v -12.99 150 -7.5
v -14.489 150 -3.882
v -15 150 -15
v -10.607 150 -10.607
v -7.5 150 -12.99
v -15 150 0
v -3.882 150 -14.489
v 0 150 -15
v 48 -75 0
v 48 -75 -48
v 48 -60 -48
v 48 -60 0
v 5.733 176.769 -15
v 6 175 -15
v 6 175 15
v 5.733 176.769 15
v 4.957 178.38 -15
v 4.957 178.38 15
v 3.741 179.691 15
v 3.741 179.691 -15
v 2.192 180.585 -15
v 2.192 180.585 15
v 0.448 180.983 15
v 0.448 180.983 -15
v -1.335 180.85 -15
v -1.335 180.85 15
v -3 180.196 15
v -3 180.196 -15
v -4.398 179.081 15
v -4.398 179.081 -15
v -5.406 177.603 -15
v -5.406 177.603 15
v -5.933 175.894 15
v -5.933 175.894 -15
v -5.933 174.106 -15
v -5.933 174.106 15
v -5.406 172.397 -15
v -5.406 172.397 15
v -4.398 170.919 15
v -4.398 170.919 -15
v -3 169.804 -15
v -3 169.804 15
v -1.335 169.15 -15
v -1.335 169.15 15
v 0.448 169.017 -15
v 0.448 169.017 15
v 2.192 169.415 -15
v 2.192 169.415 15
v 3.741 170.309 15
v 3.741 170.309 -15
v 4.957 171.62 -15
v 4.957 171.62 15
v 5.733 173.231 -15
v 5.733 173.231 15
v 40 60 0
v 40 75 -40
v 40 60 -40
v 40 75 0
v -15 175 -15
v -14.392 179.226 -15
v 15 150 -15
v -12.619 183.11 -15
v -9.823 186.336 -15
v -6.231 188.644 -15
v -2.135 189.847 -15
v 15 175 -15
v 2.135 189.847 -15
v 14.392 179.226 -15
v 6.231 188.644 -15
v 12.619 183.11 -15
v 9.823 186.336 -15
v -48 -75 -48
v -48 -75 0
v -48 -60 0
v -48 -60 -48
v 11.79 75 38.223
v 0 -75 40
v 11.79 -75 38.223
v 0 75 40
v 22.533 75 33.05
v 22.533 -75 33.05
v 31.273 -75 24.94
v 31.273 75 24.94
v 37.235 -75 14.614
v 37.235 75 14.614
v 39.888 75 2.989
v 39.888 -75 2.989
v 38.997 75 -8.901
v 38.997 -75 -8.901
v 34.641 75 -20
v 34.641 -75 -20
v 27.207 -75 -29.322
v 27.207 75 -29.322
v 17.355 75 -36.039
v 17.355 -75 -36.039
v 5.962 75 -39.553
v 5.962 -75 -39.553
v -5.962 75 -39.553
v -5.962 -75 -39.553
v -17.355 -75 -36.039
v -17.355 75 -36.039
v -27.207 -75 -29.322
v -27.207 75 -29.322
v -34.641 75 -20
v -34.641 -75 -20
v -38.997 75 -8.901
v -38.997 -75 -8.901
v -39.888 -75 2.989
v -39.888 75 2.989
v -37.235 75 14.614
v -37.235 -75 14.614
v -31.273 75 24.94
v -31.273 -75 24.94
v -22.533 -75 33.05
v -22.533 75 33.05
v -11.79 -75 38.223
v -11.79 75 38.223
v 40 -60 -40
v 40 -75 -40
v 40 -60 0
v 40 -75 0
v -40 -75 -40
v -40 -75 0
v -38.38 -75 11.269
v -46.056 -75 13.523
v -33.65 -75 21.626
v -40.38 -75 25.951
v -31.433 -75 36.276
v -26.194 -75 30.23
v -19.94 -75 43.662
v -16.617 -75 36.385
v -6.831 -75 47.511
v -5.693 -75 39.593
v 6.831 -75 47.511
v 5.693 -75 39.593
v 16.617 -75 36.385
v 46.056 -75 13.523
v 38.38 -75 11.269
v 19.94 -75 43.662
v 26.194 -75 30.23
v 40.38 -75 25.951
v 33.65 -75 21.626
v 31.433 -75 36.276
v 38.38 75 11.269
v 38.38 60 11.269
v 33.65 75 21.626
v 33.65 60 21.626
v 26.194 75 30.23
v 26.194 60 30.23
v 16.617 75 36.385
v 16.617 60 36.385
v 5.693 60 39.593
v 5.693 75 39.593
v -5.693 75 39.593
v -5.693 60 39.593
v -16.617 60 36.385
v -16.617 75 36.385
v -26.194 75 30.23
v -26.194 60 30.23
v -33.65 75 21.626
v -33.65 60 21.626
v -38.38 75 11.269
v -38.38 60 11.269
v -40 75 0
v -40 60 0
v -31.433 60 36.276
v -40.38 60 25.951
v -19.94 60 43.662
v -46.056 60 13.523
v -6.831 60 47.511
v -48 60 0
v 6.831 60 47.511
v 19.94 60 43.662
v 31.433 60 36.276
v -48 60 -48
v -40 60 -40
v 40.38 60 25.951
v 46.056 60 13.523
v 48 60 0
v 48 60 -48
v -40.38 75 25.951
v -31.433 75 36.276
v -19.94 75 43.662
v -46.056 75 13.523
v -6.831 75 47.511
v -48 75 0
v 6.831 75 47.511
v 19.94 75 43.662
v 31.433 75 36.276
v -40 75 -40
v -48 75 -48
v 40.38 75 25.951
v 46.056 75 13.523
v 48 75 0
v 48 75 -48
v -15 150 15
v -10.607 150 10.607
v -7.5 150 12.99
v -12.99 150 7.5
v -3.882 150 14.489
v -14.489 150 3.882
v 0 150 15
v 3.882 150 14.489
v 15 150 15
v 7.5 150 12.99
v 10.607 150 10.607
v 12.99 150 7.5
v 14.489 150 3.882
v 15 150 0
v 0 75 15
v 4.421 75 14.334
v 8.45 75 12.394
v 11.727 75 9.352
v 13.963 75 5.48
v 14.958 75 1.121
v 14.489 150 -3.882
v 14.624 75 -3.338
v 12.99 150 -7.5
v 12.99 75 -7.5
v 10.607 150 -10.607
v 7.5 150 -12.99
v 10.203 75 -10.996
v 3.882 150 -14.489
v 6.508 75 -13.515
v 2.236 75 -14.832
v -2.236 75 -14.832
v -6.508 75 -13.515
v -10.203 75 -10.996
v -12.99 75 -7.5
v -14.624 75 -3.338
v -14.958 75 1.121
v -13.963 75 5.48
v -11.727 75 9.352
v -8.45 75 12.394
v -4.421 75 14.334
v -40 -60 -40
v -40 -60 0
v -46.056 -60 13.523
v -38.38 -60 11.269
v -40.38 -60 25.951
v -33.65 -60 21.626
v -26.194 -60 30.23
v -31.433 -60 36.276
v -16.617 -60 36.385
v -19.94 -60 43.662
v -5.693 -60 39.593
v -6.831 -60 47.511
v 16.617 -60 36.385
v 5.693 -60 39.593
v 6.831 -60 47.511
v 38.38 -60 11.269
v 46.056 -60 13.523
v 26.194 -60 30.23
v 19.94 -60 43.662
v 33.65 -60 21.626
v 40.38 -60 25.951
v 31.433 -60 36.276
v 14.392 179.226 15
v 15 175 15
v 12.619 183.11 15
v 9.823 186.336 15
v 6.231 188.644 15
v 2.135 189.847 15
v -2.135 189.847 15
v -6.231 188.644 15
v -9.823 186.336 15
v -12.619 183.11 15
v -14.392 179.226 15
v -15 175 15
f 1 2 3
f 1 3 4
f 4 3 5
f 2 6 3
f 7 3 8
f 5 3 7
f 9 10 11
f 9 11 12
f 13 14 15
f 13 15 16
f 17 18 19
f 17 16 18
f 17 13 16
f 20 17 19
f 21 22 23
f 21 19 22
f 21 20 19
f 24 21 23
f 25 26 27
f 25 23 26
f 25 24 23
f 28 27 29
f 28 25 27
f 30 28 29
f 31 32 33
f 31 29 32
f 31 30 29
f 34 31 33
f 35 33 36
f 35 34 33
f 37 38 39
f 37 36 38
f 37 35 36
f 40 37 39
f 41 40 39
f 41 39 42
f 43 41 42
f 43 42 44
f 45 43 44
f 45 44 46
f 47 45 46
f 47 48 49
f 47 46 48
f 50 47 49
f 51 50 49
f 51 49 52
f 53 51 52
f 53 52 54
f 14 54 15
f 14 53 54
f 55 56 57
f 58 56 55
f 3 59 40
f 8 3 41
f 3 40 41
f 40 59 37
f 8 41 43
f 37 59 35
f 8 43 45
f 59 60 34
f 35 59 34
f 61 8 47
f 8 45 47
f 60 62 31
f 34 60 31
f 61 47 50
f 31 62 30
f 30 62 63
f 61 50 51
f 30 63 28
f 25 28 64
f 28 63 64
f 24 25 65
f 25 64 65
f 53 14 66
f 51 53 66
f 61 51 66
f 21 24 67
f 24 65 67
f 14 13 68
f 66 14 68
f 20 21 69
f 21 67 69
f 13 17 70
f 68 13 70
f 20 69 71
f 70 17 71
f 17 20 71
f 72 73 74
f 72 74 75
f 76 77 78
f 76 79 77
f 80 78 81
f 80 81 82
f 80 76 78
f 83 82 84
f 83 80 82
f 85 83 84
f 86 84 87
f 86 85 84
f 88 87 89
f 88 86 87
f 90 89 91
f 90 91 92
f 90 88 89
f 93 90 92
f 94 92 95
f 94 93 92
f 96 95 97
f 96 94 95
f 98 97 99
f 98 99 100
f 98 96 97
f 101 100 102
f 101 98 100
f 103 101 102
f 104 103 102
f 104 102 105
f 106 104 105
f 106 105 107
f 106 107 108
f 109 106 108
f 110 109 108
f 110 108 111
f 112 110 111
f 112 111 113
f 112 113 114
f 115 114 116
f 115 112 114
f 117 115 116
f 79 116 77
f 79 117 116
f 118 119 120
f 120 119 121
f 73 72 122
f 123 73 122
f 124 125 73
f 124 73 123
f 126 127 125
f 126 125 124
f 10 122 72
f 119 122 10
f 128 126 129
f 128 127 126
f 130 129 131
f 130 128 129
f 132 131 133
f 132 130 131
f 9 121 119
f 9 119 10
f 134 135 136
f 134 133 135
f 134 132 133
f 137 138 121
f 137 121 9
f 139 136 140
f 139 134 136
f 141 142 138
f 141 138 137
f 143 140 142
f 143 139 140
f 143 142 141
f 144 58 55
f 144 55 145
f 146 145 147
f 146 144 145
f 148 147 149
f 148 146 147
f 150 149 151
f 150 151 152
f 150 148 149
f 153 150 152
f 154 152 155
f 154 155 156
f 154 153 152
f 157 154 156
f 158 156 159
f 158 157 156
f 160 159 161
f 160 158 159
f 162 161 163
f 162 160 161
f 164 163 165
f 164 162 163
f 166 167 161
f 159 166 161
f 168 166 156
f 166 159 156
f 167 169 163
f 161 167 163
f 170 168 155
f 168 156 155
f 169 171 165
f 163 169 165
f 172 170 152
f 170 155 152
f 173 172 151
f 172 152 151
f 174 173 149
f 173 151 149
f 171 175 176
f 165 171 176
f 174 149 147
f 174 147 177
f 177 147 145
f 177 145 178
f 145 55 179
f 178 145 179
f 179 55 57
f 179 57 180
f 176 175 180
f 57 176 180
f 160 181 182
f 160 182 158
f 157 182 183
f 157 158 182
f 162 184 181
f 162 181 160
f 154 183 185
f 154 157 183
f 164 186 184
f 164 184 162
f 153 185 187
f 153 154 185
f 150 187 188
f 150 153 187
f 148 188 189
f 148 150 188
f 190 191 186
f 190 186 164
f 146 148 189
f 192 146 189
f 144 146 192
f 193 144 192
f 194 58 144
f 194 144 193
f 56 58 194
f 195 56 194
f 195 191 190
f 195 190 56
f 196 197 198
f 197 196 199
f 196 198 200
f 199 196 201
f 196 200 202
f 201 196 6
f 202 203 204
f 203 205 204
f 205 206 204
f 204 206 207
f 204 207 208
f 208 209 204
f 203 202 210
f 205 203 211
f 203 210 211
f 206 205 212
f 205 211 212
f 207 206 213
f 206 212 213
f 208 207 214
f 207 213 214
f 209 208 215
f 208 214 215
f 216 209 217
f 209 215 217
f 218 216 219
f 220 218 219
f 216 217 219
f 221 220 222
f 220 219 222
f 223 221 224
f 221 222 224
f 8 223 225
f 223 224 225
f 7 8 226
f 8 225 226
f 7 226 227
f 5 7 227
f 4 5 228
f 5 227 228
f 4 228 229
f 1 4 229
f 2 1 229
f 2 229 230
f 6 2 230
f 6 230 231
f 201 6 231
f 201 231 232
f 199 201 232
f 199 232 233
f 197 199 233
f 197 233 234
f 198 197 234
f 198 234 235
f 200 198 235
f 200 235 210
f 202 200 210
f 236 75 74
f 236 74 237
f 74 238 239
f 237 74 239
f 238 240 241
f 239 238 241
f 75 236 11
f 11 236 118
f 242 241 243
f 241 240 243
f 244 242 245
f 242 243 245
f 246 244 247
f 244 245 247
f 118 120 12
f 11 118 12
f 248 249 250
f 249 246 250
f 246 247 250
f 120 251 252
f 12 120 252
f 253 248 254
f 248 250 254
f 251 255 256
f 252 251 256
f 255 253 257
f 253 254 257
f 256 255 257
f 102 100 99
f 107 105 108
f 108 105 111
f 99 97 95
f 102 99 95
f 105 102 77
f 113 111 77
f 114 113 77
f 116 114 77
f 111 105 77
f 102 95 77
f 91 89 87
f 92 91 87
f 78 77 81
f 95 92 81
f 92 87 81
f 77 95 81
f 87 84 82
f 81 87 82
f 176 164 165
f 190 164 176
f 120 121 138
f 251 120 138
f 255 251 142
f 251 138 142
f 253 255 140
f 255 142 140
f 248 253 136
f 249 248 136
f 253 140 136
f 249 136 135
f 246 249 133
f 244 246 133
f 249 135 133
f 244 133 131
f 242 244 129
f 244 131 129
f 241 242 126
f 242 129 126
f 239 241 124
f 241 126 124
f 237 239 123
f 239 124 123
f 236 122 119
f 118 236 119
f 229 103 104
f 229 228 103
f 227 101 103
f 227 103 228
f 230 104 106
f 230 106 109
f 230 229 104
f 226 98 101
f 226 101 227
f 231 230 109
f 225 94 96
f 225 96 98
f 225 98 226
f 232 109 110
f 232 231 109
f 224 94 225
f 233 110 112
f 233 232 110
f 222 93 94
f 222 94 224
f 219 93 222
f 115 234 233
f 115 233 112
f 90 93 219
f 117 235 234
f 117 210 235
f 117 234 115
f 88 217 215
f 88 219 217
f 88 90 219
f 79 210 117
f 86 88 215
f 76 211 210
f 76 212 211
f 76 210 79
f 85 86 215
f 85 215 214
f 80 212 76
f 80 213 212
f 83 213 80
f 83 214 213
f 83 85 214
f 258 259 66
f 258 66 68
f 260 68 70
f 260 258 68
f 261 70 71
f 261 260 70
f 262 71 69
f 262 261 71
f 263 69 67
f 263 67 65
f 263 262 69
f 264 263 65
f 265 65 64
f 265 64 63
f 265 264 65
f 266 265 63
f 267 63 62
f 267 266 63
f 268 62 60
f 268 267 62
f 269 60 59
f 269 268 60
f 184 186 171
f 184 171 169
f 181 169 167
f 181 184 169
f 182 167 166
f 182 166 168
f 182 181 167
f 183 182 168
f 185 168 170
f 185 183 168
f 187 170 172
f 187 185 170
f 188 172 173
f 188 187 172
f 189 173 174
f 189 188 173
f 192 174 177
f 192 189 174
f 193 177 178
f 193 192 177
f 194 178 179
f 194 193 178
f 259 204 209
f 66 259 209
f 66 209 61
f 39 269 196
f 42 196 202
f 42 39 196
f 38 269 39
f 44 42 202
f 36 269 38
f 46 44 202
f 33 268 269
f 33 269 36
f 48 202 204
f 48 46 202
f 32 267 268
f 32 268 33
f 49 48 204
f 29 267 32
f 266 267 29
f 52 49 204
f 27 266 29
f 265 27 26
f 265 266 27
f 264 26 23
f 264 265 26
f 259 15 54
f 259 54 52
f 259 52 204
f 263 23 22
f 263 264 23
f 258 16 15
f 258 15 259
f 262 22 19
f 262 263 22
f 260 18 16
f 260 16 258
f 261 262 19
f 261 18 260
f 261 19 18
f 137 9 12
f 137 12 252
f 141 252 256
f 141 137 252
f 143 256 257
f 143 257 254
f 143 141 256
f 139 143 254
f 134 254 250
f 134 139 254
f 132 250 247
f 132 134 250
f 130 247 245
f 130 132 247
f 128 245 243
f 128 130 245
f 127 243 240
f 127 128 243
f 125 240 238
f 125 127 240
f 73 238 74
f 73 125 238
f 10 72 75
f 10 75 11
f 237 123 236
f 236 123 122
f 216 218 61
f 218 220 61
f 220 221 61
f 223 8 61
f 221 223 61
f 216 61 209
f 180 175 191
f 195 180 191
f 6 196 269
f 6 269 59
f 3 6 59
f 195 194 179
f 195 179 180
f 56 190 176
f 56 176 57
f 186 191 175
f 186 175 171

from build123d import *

# Parameters (mm, degrees)
SKETCH1_R               = 40
BOSS_EXTRUDE1_DEPTH     = 75
SKETCH2_R               = 15
BOSS_EXTRUDE2_DEPTH     = 75
SKETCH3_W               = 30
SKETCH3_H               = 30
BOSS_EXTRUDE3_DEPTH     = 25
BOSS_EXTRUDE4_DEPTH     = 30
CUT_EXTRUDE1_DEPTH      = 202.804360706
CUT_EXTRUDE1_DEPTH_BACK = 202.804360706
SKETCH5_R               = 6
BOSS_EXTRUDE6_DEPTH     = 15
BOSS_EXTRUDE8_DEPTH     = 15
SKETCH9_W               = 10
SKETCH9_H               = 15
CUT_EXTRUDE2_DEPTH      = 10
SKETCH10_W              = 10
SKETCH10_H              = 15
CUT_EXTRUDE3_DEPTH      = 10
SKETCH11_W              = 10
SKETCH11_H              = 15
CUT_EXTRUDE4_DEPTH      = 10
SKETCH12_W              = 10
SKETCH12_H              = 15
CUT_EXTRUDE5_DEPTH      = 10


with BuildPart() as part:
    # Sketch1 → Boss-Extrude1 (new, symmetric)
    with BuildSketch(Plane(origin=(0, 0, 0), x_dir=(1, 0, 0), z_dir=(0, 1, 0))):
        with Locations(Location((0, 0, 0), (0, 0, 270))):
            Circle(SKETCH1_R)
    extrude(amount=BOSS_EXTRUDE1_DEPTH, both=True)

    # Sketch2 → Boss-Extrude2 (add)
    with BuildSketch(Plane(origin=(0, 75, 0), x_dir=(1, 0, 0), z_dir=(0, 1, 0))):
        with Locations(Location((0, 0, 0), (0, 0, 270))):
            Circle(SKETCH2_R)
    extrude(amount=BOSS_EXTRUDE2_DEPTH)

    # Sketch3 → Boss-Extrude3 (add)
    with BuildSketch(Plane(origin=(0, 150, 0), x_dir=(1, 0, 0), z_dir=(0, 1, 0))):
        Rectangle(SKETCH3_W, SKETCH3_H)
    extrude(amount=BOSS_EXTRUDE3_DEPTH)

    # Sketch4 → Boss-Extrude4 (add)
    with BuildSketch(Plane.XY.offset(15)):
        with BuildLine():
            Line((-15, 175), (15, 175))
            ThreePointArc((15, 175), (0, 190), (-15, 175))
        make_face()
    extrude(amount=-BOSS_EXTRUDE4_DEPTH)

    # Sketch5 → Cut-Extrude1 (cut, two sides: drawn at the far end of the back side and taken through both)
    with BuildSketch(Plane.XY.offset(15).offset(-CUT_EXTRUDE1_DEPTH_BACK)):
        with Locations((0, 175)):
            Circle(SKETCH5_R)
    extrude(amount=CUT_EXTRUDE1_DEPTH + CUT_EXTRUDE1_DEPTH_BACK, mode=Mode.SUBTRACT)


with BuildPart() as body_2:
    # Sketch6 → Boss-Extrude6 (new body)
    with BuildSketch(Plane.XZ.offset(75)):
        with BuildLine():
            Line((-48, 0), (-48, -40))
            Line((-48, -40), (-58, -40))
            Line((-58, -40), (-58, -48))
            Line((-58, -48), (0, -48))
            Line((0, -48), (40, -48))
            Line((40, -48), (40, -58))
            Line((40, -58), (48, -58))
            Line((48, -58), (48, -40))
            Line((48, -40), (48, 0))
            ThreePointArc((48, 0), (0, 48), (-48, 0))
        make_face()
        with BuildLine():
            Line((-40, 0), (-40, -40))
            Line((-40, -40), (40, -40))
            Line((40, -40), (40, 0))
            ThreePointArc((40, 0), (0, 40), (-40, 0))
        make_face(mode=Mode.SUBTRACT)
    extrude(amount=-BOSS_EXTRUDE6_DEPTH)

    # Sketch9 → Cut-Extrude2 (cut)
    with BuildSketch(Plane.XY.offset(-40)):
        with Locations((-53, -67.5)):
            Rectangle(SKETCH9_W, SKETCH9_H)
    extrude(amount=-CUT_EXTRUDE2_DEPTH, mode=Mode.SUBTRACT)

    # Sketch12 → Cut-Extrude5 (cut)
    with BuildSketch(Plane.ZY.offset(-40)):
        with Locations((-53, -67.5)):
            Rectangle(SKETCH12_W, SKETCH12_H)
    extrude(amount=-CUT_EXTRUDE5_DEPTH, mode=Mode.SUBTRACT)


with BuildPart() as body_3:
    # Sketch7 → Boss-Extrude8 (new body)
    with BuildSketch(Plane(origin=(0, 75, 0), x_dir=(1, 0, 0), z_dir=(0, 1, 0))):
        with BuildLine():
            Line((48, 0), (48, 58))
            Line((48, 58), (40, 58))
            Line((40, 58), (40, 48))
            Line((40, 48), (-58, 48))
            Line((-58, 48), (-58, 40))
            Line((-58, 40), (-48, 40))
            Line((-48, 40), (-48, 0))
            ThreePointArc((-48, 0), (0, -48), (48, 0))
        make_face()
        with BuildLine():
            Line((40, 40), (40, 0))
            ThreePointArc((40, 0), (0, -40), (-40, 0))
            Line((-40, 0), (-40, 40))
            Line((-40, 40), (40, 40))
        make_face(mode=Mode.SUBTRACT)
    extrude(amount=-BOSS_EXTRUDE8_DEPTH)

    # Sketch10 → Cut-Extrude3 (cut)
    with BuildSketch(Plane.XY.offset(-40)):
        with Locations((-53, 67.5)):
            Rectangle(SKETCH10_W, SKETCH10_H)
    extrude(amount=-CUT_EXTRUDE3_DEPTH, mode=Mode.SUBTRACT)

    # Sketch11 → Cut-Extrude4 (cut)
    with BuildSketch(Plane.ZY.offset(-40)):
        with Locations((-53, 67.5)):
            Rectangle(SKETCH11_W, SKETCH11_H)
    extrude(amount=-CUT_EXTRUDE4_DEPTH, mode=Mode.SUBTRACT)


solid = Compound([part.part, body_2.part, body_3.part])
